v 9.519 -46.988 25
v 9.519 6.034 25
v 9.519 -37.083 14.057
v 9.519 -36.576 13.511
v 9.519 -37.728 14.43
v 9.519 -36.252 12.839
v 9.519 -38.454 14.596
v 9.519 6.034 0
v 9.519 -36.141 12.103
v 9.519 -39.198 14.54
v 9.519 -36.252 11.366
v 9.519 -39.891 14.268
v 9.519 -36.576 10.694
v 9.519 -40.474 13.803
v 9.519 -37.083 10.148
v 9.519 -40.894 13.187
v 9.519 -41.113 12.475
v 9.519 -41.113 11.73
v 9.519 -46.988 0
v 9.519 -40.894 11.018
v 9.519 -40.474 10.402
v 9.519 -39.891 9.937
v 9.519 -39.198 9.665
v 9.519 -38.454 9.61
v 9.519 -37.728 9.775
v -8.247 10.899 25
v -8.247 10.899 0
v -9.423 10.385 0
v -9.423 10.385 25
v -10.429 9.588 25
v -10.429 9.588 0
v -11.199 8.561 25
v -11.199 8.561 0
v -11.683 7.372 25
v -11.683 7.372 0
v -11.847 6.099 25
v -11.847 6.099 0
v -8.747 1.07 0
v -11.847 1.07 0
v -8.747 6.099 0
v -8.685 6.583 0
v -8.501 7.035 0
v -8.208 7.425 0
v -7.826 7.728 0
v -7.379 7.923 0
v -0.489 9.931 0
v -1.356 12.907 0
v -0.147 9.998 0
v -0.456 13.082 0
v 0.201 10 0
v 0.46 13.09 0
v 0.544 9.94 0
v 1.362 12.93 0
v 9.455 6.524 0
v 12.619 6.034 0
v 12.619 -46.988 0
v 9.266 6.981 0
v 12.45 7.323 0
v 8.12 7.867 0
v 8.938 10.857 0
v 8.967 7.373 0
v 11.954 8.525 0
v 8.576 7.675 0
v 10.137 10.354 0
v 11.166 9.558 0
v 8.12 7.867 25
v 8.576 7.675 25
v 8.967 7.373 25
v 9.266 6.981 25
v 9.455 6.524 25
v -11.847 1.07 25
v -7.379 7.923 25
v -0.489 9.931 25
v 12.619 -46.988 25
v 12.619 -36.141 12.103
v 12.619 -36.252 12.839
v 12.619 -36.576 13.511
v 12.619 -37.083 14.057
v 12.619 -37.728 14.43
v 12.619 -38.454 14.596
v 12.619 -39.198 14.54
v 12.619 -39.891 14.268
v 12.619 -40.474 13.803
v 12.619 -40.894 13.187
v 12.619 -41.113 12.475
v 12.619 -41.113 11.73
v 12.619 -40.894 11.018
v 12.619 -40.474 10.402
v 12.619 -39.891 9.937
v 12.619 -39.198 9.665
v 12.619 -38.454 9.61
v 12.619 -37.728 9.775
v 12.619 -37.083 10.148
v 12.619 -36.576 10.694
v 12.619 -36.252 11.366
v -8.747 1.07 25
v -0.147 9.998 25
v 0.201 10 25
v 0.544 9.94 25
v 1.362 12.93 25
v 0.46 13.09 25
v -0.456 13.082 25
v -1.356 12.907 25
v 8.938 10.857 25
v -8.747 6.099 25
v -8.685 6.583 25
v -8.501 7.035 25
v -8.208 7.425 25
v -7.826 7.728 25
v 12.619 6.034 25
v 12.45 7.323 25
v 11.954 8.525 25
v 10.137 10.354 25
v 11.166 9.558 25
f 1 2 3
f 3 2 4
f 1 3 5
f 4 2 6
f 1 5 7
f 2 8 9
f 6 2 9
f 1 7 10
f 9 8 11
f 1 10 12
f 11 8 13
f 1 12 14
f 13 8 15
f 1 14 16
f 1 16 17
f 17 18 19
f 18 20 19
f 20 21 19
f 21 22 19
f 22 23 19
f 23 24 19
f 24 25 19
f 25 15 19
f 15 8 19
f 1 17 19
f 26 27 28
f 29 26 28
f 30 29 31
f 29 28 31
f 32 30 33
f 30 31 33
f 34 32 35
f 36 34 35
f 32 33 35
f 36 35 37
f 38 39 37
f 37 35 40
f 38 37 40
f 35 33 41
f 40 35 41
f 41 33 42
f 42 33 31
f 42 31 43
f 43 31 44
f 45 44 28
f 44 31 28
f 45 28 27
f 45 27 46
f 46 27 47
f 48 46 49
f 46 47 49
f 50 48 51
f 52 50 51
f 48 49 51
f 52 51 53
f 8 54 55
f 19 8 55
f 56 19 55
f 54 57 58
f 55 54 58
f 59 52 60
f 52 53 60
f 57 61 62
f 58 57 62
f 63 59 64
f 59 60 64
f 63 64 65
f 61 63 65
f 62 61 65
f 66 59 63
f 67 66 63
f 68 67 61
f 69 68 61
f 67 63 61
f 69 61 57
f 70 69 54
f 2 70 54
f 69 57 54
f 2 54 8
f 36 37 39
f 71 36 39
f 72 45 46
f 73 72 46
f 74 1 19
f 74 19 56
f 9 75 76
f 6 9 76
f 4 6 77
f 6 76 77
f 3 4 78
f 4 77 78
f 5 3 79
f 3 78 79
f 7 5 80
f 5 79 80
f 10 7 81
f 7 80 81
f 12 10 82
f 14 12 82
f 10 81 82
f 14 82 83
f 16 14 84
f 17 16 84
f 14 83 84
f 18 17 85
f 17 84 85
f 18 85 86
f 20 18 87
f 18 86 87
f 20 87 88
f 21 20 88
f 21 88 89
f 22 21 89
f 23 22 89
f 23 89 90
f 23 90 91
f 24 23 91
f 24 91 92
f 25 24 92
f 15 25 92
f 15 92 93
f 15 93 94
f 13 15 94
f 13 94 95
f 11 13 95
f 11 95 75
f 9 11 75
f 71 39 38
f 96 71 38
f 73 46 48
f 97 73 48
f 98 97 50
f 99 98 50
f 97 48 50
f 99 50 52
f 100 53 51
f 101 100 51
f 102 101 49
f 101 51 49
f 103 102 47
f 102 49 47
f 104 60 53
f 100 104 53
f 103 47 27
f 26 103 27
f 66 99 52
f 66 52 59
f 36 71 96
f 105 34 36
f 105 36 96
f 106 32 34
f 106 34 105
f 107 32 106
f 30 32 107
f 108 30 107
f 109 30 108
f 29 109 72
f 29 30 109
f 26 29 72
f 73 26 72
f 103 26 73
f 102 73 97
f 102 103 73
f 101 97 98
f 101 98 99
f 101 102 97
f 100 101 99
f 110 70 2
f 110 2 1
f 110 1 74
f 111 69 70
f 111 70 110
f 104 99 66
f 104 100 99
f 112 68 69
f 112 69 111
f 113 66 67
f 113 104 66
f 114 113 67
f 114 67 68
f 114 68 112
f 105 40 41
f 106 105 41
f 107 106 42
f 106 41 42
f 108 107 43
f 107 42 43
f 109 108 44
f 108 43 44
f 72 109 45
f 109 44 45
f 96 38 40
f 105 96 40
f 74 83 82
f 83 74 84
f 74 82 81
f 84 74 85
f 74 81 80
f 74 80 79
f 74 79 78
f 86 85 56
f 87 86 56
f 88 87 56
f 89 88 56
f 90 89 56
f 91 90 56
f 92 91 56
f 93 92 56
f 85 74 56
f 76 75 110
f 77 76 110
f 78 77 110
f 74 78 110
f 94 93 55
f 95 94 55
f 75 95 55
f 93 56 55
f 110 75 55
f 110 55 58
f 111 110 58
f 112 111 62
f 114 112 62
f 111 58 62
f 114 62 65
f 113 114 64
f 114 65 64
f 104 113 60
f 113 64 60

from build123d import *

# Parameters (mm, degrees)
F1_DEPTH = 25
F3_D     = 5


with BuildPart() as f1:
    # F0 (on Top) → F1 (new body)
    with BuildSketch(Plane.XY):
        with BuildLine():
            Line((-11.847499, 6.098918), (-11.847499, 1.069734))
            Line((-11.847499, 1.069734), (-8.747498, 1.069734))
            Line((-8.747498, 1.069734), (-8.747498, 6.098918))
            ThreePointArc((-8.747498, 6.098918), (-8.367381, 7.239074), (-7.379123, 7.923027))
            Line((-7.379123, 7.923027), (-0.488766, 9.931175))
            ThreePointArc((-0.488766, 9.931175), (0.027186, 10.007), (0.544318, 9.939697))
            Line((0.544318, 9.939697), (8.120311, 7.866691))
            ThreePointArc((8.120311, 7.866691), (9.129277, 7.186715), (9.518851, 6.03406))
            Line((9.518851, 6.03406), (9.518851, -46.987938))
            Line((9.518851, -46.987938), (12.618851, -46.987938))
            Line((12.618851, -46.987938), (12.618851, 6.03406))
            ThreePointArc((12.618851, 6.03406), (11.593656, 9.067363), (8.938482, 10.856775))
            Line((8.938482, 10.856775), (1.362489, 12.92978))
            ThreePointArc((1.362489, 12.92978), (0.001614, 13.106895), (-1.356153, 12.907354))
            Line((-1.356153, 12.907354), (-8.24651, 10.899206))
            ThreePointArc((-8.24651, 10.899206), (-10.84719, 9.099329), (-11.847499, 6.098918))
        make_face()
    extrude(amount=F1_DEPTH)

    # F3 (through all)
    with Locations(Plane(origin=(9.518851, 0, 0), x_dir=(0, -1, 0), z_dir=(-1, 0, 0))):
        with Locations((38.641255, 12.102515)):
            Hole(F3_D / 2)


solid = f1.part
